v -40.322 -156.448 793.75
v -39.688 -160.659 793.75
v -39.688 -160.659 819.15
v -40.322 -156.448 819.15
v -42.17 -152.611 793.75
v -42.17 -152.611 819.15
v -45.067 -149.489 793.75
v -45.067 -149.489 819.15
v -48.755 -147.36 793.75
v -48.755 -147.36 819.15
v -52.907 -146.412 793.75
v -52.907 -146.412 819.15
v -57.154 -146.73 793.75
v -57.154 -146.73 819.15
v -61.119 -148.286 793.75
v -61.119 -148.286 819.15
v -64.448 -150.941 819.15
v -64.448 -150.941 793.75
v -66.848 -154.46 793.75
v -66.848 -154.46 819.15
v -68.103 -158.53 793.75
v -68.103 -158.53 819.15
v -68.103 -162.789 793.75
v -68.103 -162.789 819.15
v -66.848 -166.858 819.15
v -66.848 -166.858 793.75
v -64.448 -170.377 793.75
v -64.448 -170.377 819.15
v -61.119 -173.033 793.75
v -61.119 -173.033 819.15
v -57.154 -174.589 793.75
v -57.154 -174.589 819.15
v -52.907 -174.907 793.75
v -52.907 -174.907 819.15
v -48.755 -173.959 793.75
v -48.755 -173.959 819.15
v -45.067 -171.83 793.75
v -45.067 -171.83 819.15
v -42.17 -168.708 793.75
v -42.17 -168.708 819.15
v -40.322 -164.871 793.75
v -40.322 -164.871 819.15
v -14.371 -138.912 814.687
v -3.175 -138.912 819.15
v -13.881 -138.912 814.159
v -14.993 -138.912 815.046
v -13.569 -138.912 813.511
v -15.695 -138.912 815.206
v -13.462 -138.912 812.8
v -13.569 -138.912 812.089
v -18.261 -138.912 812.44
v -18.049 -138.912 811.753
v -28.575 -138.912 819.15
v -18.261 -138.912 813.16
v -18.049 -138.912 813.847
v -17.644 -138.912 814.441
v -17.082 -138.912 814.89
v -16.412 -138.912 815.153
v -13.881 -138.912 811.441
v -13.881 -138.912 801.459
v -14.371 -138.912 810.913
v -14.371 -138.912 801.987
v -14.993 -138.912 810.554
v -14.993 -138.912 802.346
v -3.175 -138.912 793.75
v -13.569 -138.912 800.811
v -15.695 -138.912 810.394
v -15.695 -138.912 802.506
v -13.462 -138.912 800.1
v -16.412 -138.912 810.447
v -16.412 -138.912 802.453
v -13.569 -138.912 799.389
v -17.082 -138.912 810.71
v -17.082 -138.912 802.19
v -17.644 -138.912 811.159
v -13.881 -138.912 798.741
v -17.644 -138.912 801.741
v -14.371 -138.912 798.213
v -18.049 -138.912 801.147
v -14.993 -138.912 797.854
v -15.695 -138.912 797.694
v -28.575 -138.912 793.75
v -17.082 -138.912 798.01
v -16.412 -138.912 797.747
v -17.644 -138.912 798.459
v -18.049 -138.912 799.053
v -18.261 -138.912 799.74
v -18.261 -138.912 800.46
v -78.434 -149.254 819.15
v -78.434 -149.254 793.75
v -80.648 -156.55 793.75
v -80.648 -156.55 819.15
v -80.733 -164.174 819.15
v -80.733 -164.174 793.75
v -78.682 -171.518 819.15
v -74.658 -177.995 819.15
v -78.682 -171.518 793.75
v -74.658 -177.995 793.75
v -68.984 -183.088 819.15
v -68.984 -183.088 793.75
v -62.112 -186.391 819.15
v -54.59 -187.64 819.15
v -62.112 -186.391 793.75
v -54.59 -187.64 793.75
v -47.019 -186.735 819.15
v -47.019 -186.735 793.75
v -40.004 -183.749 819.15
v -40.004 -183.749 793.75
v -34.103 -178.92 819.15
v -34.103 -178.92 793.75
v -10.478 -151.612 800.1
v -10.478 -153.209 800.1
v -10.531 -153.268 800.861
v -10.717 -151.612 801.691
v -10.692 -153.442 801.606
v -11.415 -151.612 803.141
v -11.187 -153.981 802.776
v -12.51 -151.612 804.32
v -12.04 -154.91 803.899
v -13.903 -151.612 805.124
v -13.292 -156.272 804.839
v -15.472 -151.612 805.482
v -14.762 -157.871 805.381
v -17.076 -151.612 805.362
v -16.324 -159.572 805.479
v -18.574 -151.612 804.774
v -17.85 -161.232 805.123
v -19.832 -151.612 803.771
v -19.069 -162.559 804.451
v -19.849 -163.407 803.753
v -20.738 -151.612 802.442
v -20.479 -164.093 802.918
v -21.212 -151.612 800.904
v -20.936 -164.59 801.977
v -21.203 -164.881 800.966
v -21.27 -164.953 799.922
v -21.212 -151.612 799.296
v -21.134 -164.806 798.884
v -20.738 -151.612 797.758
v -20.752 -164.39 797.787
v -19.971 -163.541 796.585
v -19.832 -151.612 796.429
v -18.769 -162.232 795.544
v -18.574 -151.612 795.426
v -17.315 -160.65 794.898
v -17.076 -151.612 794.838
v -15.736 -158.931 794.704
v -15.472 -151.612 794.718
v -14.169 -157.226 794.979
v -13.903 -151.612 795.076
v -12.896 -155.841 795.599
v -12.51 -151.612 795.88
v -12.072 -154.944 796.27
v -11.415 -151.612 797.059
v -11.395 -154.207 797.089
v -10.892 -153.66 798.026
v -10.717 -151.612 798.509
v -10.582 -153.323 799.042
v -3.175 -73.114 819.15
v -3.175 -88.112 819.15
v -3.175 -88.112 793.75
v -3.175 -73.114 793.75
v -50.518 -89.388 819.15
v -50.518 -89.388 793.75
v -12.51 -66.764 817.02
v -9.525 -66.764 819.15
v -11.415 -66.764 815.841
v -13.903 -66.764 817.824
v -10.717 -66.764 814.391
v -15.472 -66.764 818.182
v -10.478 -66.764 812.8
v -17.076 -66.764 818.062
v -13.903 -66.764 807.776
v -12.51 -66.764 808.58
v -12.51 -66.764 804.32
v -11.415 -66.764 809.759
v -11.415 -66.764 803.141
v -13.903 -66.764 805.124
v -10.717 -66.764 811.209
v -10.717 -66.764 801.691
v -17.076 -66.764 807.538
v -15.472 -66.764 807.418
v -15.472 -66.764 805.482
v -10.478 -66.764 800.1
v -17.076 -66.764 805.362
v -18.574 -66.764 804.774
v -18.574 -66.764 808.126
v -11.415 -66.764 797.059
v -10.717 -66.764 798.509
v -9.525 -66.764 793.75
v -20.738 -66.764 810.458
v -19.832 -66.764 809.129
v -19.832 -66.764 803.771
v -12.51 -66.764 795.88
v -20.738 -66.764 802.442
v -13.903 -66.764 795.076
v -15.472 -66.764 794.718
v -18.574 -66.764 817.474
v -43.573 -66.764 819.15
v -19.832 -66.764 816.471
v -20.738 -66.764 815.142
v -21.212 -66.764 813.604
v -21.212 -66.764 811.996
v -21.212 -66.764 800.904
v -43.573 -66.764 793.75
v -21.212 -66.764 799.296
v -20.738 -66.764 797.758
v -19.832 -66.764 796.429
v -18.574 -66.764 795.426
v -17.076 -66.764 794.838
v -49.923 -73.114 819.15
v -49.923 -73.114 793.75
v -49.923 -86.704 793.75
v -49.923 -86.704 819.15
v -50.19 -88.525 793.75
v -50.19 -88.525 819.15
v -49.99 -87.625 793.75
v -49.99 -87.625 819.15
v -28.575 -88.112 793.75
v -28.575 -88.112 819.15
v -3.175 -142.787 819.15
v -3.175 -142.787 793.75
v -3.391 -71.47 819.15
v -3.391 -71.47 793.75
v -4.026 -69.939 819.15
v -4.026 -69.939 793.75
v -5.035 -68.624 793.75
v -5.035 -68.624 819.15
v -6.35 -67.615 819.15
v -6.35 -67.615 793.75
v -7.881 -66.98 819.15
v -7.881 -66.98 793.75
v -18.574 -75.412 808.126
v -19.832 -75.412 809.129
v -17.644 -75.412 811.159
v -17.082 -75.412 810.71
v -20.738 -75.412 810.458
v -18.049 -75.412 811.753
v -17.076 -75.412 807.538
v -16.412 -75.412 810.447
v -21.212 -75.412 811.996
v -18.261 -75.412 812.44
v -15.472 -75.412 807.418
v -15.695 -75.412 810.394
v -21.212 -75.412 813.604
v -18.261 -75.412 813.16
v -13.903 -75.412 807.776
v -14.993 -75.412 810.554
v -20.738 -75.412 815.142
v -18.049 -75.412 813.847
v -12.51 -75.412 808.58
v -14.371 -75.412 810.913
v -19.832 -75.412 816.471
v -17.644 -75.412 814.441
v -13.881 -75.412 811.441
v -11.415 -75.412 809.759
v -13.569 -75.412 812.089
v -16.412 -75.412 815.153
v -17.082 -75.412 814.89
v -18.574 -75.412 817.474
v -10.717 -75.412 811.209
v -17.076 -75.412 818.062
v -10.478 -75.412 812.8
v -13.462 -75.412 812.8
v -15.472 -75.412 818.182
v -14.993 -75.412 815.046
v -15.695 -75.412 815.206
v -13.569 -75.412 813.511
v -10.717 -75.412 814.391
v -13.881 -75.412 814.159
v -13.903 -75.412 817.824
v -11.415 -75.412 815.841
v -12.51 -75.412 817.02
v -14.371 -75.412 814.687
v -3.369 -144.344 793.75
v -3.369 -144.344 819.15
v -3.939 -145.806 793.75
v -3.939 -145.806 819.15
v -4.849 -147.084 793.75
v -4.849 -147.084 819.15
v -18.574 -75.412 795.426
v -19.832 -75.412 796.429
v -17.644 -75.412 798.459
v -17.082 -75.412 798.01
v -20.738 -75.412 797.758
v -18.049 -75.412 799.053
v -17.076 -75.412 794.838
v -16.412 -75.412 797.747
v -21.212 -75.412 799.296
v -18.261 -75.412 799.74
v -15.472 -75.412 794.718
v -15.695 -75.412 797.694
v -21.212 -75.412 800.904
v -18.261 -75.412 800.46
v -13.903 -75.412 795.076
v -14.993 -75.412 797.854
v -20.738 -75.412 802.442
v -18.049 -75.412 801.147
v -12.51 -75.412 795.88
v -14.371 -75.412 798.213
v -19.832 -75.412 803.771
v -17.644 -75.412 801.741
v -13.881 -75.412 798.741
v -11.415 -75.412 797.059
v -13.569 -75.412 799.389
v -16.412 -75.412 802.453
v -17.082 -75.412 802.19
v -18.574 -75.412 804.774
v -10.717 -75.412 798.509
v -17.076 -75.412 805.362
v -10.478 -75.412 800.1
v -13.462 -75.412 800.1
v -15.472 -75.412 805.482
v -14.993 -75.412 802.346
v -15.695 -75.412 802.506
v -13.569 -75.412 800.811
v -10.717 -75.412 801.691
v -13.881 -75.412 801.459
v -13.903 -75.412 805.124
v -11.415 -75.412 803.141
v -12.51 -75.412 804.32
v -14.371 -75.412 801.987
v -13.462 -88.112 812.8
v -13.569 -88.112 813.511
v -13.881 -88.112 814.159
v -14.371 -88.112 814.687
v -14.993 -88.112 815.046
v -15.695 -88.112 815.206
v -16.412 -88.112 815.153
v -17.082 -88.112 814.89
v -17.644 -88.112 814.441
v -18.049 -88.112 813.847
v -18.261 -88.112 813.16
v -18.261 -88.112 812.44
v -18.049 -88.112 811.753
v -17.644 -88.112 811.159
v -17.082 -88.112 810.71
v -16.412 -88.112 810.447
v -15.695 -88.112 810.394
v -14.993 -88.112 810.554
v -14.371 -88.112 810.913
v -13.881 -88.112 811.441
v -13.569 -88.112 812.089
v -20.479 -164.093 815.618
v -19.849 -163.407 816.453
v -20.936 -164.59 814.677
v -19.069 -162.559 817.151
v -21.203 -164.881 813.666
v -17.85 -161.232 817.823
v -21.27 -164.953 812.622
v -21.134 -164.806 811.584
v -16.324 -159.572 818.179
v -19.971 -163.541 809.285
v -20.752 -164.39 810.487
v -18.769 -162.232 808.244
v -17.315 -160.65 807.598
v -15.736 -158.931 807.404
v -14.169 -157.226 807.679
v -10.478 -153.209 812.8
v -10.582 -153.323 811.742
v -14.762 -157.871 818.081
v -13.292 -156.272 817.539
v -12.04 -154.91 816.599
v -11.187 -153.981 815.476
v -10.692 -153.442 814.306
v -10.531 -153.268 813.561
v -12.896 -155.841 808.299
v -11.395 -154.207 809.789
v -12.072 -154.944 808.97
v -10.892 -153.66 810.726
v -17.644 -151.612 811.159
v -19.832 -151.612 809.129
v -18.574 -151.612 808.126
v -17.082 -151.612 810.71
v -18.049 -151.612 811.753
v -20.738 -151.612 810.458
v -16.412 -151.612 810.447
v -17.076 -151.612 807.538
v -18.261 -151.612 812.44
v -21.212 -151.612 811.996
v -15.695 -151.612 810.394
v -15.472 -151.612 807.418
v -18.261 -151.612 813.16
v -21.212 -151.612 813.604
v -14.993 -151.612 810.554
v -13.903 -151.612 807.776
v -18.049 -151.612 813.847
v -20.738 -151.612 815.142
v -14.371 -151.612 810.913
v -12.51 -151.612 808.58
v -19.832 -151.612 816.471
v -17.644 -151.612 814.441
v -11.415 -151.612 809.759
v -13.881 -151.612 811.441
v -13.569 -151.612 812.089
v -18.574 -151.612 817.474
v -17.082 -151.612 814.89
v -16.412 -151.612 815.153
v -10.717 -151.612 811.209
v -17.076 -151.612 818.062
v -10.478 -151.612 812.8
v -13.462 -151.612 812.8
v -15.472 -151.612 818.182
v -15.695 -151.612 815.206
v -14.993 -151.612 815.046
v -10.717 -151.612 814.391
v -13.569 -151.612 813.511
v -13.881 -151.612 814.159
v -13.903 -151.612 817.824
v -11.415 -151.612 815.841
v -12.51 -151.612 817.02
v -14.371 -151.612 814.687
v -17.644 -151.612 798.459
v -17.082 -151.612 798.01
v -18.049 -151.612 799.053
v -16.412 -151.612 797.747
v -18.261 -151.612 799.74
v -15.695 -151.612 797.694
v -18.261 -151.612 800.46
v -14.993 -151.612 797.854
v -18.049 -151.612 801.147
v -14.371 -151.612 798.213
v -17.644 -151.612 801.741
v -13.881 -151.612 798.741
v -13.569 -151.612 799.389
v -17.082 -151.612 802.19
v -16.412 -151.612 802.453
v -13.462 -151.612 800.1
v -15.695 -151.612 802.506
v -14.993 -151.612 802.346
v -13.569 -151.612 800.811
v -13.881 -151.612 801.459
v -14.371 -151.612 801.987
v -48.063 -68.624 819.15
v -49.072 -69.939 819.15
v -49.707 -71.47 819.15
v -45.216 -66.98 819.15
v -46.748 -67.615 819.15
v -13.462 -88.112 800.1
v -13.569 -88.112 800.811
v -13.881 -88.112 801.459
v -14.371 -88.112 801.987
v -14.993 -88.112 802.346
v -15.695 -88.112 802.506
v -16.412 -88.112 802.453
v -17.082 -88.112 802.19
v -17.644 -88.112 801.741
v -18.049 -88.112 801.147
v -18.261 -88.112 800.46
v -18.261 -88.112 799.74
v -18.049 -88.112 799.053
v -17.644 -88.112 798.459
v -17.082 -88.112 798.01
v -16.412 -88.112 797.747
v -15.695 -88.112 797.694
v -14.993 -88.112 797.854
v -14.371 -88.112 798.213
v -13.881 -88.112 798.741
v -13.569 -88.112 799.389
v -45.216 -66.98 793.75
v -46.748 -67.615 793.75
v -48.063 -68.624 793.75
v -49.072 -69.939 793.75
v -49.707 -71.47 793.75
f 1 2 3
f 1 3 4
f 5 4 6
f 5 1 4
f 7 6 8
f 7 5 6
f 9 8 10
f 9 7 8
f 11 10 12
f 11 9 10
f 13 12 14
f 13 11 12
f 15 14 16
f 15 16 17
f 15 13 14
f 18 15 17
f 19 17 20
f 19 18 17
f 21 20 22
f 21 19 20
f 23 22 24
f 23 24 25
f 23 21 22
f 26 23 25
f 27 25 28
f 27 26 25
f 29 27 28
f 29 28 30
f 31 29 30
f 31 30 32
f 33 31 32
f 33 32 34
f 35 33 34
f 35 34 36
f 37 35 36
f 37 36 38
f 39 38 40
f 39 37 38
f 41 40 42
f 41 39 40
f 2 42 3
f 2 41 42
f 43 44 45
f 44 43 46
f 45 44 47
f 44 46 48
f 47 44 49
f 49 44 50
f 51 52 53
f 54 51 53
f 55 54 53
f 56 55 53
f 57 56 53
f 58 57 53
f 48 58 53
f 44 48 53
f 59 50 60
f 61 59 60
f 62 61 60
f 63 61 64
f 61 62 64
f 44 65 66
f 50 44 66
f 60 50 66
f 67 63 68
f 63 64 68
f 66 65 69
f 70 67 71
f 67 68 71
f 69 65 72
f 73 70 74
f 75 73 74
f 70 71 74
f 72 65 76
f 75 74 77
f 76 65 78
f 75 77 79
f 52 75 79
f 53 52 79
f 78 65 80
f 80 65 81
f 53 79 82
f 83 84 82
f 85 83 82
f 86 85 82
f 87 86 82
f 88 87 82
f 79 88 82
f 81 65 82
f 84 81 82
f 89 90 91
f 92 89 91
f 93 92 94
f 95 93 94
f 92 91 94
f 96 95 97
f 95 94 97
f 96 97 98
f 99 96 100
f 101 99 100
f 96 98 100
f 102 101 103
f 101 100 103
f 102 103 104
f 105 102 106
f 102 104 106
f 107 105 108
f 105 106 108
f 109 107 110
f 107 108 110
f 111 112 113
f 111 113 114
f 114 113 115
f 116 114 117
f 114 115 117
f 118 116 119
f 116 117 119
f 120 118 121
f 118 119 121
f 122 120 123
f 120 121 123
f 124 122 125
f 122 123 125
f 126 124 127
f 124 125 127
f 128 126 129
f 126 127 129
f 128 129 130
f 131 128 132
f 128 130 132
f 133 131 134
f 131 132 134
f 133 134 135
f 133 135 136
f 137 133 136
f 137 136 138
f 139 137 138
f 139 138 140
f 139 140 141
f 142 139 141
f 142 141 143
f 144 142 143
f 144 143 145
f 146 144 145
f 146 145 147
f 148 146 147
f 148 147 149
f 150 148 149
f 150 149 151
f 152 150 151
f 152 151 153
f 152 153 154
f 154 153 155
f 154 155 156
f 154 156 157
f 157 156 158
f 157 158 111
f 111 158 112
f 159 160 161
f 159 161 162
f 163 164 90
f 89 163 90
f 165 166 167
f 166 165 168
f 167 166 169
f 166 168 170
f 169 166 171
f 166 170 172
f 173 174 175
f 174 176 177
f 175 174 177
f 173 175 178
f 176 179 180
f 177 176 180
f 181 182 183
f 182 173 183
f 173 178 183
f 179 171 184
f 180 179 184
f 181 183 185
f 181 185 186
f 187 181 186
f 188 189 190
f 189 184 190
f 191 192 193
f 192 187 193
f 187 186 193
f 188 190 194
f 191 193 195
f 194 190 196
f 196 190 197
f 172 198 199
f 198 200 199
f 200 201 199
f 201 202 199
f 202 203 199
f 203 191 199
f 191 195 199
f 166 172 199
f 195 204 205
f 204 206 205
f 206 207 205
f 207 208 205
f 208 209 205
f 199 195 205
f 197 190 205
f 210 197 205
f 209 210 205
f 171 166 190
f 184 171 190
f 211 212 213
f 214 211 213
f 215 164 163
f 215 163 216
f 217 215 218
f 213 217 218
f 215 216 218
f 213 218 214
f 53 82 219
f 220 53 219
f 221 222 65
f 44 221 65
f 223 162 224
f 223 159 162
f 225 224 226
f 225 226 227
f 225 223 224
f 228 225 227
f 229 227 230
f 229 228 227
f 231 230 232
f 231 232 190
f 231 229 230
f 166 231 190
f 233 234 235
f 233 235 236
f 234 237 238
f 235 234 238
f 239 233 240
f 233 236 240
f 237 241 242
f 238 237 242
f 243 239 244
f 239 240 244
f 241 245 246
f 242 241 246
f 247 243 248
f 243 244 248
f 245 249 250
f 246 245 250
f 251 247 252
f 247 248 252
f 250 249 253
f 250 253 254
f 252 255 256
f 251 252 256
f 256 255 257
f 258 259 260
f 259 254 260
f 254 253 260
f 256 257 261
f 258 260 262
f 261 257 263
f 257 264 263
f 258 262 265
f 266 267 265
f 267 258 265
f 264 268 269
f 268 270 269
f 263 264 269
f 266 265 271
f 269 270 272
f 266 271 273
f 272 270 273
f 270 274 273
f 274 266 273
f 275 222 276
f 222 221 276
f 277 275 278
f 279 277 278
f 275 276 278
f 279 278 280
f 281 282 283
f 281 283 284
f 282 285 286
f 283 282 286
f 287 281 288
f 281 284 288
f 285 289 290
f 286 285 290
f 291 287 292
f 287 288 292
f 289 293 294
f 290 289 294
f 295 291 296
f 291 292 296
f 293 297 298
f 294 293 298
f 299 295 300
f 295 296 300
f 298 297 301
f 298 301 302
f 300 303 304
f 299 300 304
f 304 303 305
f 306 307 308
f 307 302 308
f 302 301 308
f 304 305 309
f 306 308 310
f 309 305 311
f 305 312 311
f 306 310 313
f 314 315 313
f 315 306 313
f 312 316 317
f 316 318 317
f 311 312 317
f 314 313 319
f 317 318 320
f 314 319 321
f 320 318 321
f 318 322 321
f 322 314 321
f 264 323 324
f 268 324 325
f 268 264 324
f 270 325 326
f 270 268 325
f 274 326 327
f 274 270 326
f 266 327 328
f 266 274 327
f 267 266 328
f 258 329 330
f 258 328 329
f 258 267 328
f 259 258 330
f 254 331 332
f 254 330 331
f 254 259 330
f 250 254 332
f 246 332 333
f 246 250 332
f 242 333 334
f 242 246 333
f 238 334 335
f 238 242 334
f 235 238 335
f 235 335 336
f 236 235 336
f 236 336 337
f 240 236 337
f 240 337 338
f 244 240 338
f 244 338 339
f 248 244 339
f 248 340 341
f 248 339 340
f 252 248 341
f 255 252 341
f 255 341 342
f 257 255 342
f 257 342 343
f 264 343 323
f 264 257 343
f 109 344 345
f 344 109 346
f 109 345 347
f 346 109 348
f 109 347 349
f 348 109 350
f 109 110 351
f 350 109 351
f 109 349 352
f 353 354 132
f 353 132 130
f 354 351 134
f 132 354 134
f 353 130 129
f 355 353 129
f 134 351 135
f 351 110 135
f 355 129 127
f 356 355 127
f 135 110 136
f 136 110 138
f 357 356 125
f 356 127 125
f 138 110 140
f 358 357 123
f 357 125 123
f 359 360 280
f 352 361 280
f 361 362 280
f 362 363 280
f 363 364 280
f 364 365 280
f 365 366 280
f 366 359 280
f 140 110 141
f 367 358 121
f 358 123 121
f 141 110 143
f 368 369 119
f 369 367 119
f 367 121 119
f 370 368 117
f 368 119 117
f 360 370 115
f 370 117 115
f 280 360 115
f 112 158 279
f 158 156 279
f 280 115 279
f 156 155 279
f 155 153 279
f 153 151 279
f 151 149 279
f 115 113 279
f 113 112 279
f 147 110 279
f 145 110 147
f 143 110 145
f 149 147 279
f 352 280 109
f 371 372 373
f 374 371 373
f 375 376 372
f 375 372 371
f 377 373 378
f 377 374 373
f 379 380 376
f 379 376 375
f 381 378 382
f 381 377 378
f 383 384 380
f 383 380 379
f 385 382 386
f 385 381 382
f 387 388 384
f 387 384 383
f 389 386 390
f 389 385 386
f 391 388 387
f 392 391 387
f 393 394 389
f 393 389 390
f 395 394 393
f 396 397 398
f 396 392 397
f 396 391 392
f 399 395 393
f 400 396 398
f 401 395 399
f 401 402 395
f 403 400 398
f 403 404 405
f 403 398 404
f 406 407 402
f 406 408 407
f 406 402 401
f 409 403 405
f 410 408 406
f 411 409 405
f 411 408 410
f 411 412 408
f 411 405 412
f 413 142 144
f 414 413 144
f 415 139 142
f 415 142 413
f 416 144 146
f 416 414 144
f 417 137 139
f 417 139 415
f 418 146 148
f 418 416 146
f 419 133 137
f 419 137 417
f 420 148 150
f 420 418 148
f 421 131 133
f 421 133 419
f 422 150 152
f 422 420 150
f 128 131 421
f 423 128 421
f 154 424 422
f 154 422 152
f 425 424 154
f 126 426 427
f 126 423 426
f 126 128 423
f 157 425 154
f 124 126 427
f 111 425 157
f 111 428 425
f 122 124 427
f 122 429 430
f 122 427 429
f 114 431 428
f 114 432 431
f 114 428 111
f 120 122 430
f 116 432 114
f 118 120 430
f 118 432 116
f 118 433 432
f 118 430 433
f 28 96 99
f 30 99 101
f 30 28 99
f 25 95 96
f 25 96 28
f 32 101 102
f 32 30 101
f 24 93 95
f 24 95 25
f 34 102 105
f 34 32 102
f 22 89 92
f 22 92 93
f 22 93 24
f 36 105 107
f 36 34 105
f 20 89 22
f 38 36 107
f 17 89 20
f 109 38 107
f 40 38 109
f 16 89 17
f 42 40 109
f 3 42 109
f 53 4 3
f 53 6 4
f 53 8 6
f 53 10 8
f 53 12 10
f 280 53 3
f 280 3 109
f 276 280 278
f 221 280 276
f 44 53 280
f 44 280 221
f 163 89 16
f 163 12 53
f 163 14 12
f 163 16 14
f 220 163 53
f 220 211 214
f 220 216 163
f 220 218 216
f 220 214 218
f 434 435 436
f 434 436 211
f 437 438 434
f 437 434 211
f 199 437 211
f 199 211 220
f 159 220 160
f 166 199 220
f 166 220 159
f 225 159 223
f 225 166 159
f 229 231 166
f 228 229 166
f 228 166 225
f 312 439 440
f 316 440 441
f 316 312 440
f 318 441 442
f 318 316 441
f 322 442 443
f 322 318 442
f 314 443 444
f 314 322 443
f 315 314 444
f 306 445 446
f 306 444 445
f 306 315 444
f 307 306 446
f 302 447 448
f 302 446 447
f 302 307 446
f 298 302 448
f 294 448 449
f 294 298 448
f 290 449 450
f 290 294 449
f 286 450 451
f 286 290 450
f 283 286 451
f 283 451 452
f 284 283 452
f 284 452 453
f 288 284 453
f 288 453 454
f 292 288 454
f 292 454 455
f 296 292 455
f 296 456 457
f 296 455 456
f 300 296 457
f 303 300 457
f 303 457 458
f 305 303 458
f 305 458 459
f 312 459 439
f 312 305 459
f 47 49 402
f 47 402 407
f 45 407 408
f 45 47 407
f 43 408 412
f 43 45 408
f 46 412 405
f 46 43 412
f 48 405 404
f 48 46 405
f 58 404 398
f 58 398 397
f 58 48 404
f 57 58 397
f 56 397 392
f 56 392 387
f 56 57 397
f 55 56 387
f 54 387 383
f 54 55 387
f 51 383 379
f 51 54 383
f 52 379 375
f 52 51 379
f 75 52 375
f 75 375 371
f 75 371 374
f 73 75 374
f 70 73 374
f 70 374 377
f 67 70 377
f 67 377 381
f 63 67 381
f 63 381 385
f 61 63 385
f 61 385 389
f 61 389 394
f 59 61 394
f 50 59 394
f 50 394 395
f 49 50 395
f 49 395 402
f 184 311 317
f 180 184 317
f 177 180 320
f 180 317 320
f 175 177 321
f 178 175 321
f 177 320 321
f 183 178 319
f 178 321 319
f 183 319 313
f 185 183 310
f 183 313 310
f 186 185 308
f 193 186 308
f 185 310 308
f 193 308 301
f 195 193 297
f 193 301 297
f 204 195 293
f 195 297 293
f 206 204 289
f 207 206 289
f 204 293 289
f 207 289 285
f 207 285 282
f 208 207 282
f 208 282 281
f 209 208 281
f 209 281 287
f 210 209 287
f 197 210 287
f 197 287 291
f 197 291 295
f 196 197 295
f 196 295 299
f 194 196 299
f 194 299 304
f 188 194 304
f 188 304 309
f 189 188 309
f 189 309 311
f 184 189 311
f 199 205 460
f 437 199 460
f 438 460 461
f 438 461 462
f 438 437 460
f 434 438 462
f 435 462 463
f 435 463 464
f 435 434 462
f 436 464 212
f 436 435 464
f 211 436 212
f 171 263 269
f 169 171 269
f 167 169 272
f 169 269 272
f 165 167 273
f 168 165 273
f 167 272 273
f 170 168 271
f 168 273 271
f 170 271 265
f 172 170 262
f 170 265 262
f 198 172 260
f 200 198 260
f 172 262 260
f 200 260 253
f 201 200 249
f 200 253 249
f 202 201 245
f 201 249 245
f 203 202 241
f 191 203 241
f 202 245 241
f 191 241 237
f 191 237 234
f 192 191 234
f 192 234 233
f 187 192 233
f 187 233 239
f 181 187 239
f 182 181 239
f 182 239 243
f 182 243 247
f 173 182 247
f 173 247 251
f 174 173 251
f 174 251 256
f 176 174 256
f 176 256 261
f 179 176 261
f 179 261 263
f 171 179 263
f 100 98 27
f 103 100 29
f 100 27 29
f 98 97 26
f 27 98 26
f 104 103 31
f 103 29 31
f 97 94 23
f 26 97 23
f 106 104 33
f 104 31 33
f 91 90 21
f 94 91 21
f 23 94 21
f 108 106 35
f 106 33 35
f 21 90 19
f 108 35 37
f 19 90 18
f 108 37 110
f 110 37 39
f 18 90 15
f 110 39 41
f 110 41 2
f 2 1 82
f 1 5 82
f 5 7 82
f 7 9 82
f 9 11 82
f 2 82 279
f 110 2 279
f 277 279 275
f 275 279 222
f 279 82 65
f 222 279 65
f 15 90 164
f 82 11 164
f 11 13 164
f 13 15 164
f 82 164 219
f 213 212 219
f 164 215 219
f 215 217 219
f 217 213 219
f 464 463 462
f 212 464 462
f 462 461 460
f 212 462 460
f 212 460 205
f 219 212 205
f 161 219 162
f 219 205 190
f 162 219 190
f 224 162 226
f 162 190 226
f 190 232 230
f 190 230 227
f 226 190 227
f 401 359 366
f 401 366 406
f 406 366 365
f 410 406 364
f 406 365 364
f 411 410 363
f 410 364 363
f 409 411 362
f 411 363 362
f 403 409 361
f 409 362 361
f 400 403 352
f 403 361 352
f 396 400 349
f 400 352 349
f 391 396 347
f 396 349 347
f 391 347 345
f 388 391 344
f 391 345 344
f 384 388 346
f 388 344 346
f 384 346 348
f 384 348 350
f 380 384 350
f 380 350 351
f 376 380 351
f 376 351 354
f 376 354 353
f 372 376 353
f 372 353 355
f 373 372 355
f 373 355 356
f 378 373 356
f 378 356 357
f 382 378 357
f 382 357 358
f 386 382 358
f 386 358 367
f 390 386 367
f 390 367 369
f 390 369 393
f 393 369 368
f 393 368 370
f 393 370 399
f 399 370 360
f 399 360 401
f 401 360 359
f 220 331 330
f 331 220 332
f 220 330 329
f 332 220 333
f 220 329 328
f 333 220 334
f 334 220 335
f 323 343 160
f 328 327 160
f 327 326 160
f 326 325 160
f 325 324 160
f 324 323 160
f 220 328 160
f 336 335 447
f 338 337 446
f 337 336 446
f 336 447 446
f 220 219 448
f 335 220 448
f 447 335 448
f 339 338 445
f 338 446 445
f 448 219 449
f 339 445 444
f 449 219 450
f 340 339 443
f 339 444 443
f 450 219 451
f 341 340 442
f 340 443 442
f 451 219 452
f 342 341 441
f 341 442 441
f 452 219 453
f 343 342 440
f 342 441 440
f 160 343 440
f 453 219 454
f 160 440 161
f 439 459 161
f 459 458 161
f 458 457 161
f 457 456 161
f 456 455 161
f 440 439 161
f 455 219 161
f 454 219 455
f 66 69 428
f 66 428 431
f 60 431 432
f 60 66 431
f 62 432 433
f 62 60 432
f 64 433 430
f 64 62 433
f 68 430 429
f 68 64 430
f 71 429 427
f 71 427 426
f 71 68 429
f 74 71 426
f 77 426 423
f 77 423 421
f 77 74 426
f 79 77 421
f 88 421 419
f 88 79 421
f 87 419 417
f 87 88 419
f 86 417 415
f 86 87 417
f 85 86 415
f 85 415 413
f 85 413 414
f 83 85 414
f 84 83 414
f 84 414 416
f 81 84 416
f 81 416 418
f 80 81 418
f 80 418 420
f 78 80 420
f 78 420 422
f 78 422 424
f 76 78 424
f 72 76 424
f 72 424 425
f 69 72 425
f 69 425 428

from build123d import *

# Parameters (mm, degrees)
SKETCH1_R               = 14.2875
INITIAL_PLATE_DEPTH     = 25.4
INITIAL_START           = -22.347989325
SKETCH3_R               = 2.413
INITIAL_BOLT_HOLE_DEPTH = 122.882919484
INITIAL_START_2         = -12.7
SKETCH3_3_R             = 5.3975
SKETCH3_3_R_2           = 2.413
INITIAL_HEAD_HOLE_DEPTH = 9.647989325
OTHER_START             = 90.807702
SKETCH3_4_R             = 5.3975
SKETCH3_4_R_2           = 2.413
OTHER_HEAD_HOLE_DEPTH   = 27.307702
MOUNTING_PATTERN_COUNT  = 2
MOUNTING_PATTERN_PITCH  = 12.7
FILLET1_R               = 6.35


with BuildPart() as part:
    # Sketch1 → Initial Plate (new body)
    with BuildSketch(Plane(origin=(0, -13.010095613, 793.75), x_dir=(1, 0, 0), z_dir=(0, 0, 1))):
        with BuildLine():
            Line((-3.175, -125.901852304), (-28.575, -125.901852304))
            Line((-28.575, -125.901852304), (-28.575, -75.101852304))
            Line((-28.575, -75.101852304), (-3.175, -75.101852304))
            Line((-3.175, -75.101852304), (-3.175, -53.753862978))
            Line((-3.175, -53.753862978), (-49.922989325, -53.753862978))
            Line((-49.922989325, -53.753862978), (-49.922989325, -75.101852304))
            Line((-49.922989325, -75.101852304), (-78.433981403, -136.243872124))
            ThreePointArc((-78.433981403, -136.243872124), (-68.984123144, -170.078089357), (-34.103220183, -165.909554179))
            Line((-34.103220183, -165.909554179), (-3.175, -132.251852304))
            Line((-3.175, -132.251852304), (-3.175, -125.901852304))
        make_face()
        with Locations((-53.975, -147.649282463)):
            Circle(SKETCH1_R, mode=Mode.SUBTRACT)
    extrude(amount=INITIAL_PLATE_DEPTH)

    # Sketch3 → Initial Bolt Hole (cut)
    with BuildSketch(Plane.XZ.offset(88.111947917).offset(INITIAL_START)):
        with Locations((-15.875, 800.1)):
            Circle(SKETCH3_R)
    initial_bolt_hole = extrude(amount=INITIAL_BOLT_HOLE_DEPTH, mode=Mode.SUBTRACT)

    # Sketch3<3> → Initial Head Hole (cut, through all)
    with BuildSketch(Plane.XZ.offset(88.111947917).offset(INITIAL_START_2)):
        with Locations((-15.875, 800.1)):
            Circle(SKETCH3_3_R)
        with Locations((-15.875, 800.1)):
            Circle(SKETCH3_3_R_2, mode=Mode.SUBTRACT)
    initial_head_hole = extrude(amount=-INITIAL_HEAD_HOLE_DEPTH, mode=Mode.SUBTRACT)

    # Sketch3<4> → Other Head Hole (cut)
    with BuildSketch(Plane.XZ.offset(88.111947917).offset(OTHER_START)):
        with Locations((-15.875, 800.1)):
            Circle(SKETCH3_4_R)
        with Locations((-15.875, 800.1)):
            Circle(SKETCH3_4_R_2, mode=Mode.SUBTRACT)
    other_head_hole = extrude(amount=-OTHER_HEAD_HOLE_DEPTH, mode=Mode.SUBTRACT)

    # Mounting Pattern: Initial Bolt Hole, Initial Head Hole, Other Head Hole ×2
    with Locations(*[(0, 0, i * MOUNTING_PATTERN_PITCH) for i in range(1, MOUNTING_PATTERN_COUNT)]):
        add(initial_bolt_hole, mode=Mode.SUBTRACT)
        add(initial_head_hole, mode=Mode.SUBTRACT)
        add(other_head_hole, mode=Mode.SUBTRACT)

    # Fillet1
    fillet1_edges = [part.edges().sort_by_distance(p)[0] for p in [
        (-3.175, -145.261947917, 806.45),
        (-49.922989325, -88.111947917, 806.45),
        (-49.922989325, -66.763958592, 806.45),
        (-3.175, -66.763958592, 806.45),
    ]]
    fillet(fillet1_edges, radius=FILLET1_R)


solid = part.part
